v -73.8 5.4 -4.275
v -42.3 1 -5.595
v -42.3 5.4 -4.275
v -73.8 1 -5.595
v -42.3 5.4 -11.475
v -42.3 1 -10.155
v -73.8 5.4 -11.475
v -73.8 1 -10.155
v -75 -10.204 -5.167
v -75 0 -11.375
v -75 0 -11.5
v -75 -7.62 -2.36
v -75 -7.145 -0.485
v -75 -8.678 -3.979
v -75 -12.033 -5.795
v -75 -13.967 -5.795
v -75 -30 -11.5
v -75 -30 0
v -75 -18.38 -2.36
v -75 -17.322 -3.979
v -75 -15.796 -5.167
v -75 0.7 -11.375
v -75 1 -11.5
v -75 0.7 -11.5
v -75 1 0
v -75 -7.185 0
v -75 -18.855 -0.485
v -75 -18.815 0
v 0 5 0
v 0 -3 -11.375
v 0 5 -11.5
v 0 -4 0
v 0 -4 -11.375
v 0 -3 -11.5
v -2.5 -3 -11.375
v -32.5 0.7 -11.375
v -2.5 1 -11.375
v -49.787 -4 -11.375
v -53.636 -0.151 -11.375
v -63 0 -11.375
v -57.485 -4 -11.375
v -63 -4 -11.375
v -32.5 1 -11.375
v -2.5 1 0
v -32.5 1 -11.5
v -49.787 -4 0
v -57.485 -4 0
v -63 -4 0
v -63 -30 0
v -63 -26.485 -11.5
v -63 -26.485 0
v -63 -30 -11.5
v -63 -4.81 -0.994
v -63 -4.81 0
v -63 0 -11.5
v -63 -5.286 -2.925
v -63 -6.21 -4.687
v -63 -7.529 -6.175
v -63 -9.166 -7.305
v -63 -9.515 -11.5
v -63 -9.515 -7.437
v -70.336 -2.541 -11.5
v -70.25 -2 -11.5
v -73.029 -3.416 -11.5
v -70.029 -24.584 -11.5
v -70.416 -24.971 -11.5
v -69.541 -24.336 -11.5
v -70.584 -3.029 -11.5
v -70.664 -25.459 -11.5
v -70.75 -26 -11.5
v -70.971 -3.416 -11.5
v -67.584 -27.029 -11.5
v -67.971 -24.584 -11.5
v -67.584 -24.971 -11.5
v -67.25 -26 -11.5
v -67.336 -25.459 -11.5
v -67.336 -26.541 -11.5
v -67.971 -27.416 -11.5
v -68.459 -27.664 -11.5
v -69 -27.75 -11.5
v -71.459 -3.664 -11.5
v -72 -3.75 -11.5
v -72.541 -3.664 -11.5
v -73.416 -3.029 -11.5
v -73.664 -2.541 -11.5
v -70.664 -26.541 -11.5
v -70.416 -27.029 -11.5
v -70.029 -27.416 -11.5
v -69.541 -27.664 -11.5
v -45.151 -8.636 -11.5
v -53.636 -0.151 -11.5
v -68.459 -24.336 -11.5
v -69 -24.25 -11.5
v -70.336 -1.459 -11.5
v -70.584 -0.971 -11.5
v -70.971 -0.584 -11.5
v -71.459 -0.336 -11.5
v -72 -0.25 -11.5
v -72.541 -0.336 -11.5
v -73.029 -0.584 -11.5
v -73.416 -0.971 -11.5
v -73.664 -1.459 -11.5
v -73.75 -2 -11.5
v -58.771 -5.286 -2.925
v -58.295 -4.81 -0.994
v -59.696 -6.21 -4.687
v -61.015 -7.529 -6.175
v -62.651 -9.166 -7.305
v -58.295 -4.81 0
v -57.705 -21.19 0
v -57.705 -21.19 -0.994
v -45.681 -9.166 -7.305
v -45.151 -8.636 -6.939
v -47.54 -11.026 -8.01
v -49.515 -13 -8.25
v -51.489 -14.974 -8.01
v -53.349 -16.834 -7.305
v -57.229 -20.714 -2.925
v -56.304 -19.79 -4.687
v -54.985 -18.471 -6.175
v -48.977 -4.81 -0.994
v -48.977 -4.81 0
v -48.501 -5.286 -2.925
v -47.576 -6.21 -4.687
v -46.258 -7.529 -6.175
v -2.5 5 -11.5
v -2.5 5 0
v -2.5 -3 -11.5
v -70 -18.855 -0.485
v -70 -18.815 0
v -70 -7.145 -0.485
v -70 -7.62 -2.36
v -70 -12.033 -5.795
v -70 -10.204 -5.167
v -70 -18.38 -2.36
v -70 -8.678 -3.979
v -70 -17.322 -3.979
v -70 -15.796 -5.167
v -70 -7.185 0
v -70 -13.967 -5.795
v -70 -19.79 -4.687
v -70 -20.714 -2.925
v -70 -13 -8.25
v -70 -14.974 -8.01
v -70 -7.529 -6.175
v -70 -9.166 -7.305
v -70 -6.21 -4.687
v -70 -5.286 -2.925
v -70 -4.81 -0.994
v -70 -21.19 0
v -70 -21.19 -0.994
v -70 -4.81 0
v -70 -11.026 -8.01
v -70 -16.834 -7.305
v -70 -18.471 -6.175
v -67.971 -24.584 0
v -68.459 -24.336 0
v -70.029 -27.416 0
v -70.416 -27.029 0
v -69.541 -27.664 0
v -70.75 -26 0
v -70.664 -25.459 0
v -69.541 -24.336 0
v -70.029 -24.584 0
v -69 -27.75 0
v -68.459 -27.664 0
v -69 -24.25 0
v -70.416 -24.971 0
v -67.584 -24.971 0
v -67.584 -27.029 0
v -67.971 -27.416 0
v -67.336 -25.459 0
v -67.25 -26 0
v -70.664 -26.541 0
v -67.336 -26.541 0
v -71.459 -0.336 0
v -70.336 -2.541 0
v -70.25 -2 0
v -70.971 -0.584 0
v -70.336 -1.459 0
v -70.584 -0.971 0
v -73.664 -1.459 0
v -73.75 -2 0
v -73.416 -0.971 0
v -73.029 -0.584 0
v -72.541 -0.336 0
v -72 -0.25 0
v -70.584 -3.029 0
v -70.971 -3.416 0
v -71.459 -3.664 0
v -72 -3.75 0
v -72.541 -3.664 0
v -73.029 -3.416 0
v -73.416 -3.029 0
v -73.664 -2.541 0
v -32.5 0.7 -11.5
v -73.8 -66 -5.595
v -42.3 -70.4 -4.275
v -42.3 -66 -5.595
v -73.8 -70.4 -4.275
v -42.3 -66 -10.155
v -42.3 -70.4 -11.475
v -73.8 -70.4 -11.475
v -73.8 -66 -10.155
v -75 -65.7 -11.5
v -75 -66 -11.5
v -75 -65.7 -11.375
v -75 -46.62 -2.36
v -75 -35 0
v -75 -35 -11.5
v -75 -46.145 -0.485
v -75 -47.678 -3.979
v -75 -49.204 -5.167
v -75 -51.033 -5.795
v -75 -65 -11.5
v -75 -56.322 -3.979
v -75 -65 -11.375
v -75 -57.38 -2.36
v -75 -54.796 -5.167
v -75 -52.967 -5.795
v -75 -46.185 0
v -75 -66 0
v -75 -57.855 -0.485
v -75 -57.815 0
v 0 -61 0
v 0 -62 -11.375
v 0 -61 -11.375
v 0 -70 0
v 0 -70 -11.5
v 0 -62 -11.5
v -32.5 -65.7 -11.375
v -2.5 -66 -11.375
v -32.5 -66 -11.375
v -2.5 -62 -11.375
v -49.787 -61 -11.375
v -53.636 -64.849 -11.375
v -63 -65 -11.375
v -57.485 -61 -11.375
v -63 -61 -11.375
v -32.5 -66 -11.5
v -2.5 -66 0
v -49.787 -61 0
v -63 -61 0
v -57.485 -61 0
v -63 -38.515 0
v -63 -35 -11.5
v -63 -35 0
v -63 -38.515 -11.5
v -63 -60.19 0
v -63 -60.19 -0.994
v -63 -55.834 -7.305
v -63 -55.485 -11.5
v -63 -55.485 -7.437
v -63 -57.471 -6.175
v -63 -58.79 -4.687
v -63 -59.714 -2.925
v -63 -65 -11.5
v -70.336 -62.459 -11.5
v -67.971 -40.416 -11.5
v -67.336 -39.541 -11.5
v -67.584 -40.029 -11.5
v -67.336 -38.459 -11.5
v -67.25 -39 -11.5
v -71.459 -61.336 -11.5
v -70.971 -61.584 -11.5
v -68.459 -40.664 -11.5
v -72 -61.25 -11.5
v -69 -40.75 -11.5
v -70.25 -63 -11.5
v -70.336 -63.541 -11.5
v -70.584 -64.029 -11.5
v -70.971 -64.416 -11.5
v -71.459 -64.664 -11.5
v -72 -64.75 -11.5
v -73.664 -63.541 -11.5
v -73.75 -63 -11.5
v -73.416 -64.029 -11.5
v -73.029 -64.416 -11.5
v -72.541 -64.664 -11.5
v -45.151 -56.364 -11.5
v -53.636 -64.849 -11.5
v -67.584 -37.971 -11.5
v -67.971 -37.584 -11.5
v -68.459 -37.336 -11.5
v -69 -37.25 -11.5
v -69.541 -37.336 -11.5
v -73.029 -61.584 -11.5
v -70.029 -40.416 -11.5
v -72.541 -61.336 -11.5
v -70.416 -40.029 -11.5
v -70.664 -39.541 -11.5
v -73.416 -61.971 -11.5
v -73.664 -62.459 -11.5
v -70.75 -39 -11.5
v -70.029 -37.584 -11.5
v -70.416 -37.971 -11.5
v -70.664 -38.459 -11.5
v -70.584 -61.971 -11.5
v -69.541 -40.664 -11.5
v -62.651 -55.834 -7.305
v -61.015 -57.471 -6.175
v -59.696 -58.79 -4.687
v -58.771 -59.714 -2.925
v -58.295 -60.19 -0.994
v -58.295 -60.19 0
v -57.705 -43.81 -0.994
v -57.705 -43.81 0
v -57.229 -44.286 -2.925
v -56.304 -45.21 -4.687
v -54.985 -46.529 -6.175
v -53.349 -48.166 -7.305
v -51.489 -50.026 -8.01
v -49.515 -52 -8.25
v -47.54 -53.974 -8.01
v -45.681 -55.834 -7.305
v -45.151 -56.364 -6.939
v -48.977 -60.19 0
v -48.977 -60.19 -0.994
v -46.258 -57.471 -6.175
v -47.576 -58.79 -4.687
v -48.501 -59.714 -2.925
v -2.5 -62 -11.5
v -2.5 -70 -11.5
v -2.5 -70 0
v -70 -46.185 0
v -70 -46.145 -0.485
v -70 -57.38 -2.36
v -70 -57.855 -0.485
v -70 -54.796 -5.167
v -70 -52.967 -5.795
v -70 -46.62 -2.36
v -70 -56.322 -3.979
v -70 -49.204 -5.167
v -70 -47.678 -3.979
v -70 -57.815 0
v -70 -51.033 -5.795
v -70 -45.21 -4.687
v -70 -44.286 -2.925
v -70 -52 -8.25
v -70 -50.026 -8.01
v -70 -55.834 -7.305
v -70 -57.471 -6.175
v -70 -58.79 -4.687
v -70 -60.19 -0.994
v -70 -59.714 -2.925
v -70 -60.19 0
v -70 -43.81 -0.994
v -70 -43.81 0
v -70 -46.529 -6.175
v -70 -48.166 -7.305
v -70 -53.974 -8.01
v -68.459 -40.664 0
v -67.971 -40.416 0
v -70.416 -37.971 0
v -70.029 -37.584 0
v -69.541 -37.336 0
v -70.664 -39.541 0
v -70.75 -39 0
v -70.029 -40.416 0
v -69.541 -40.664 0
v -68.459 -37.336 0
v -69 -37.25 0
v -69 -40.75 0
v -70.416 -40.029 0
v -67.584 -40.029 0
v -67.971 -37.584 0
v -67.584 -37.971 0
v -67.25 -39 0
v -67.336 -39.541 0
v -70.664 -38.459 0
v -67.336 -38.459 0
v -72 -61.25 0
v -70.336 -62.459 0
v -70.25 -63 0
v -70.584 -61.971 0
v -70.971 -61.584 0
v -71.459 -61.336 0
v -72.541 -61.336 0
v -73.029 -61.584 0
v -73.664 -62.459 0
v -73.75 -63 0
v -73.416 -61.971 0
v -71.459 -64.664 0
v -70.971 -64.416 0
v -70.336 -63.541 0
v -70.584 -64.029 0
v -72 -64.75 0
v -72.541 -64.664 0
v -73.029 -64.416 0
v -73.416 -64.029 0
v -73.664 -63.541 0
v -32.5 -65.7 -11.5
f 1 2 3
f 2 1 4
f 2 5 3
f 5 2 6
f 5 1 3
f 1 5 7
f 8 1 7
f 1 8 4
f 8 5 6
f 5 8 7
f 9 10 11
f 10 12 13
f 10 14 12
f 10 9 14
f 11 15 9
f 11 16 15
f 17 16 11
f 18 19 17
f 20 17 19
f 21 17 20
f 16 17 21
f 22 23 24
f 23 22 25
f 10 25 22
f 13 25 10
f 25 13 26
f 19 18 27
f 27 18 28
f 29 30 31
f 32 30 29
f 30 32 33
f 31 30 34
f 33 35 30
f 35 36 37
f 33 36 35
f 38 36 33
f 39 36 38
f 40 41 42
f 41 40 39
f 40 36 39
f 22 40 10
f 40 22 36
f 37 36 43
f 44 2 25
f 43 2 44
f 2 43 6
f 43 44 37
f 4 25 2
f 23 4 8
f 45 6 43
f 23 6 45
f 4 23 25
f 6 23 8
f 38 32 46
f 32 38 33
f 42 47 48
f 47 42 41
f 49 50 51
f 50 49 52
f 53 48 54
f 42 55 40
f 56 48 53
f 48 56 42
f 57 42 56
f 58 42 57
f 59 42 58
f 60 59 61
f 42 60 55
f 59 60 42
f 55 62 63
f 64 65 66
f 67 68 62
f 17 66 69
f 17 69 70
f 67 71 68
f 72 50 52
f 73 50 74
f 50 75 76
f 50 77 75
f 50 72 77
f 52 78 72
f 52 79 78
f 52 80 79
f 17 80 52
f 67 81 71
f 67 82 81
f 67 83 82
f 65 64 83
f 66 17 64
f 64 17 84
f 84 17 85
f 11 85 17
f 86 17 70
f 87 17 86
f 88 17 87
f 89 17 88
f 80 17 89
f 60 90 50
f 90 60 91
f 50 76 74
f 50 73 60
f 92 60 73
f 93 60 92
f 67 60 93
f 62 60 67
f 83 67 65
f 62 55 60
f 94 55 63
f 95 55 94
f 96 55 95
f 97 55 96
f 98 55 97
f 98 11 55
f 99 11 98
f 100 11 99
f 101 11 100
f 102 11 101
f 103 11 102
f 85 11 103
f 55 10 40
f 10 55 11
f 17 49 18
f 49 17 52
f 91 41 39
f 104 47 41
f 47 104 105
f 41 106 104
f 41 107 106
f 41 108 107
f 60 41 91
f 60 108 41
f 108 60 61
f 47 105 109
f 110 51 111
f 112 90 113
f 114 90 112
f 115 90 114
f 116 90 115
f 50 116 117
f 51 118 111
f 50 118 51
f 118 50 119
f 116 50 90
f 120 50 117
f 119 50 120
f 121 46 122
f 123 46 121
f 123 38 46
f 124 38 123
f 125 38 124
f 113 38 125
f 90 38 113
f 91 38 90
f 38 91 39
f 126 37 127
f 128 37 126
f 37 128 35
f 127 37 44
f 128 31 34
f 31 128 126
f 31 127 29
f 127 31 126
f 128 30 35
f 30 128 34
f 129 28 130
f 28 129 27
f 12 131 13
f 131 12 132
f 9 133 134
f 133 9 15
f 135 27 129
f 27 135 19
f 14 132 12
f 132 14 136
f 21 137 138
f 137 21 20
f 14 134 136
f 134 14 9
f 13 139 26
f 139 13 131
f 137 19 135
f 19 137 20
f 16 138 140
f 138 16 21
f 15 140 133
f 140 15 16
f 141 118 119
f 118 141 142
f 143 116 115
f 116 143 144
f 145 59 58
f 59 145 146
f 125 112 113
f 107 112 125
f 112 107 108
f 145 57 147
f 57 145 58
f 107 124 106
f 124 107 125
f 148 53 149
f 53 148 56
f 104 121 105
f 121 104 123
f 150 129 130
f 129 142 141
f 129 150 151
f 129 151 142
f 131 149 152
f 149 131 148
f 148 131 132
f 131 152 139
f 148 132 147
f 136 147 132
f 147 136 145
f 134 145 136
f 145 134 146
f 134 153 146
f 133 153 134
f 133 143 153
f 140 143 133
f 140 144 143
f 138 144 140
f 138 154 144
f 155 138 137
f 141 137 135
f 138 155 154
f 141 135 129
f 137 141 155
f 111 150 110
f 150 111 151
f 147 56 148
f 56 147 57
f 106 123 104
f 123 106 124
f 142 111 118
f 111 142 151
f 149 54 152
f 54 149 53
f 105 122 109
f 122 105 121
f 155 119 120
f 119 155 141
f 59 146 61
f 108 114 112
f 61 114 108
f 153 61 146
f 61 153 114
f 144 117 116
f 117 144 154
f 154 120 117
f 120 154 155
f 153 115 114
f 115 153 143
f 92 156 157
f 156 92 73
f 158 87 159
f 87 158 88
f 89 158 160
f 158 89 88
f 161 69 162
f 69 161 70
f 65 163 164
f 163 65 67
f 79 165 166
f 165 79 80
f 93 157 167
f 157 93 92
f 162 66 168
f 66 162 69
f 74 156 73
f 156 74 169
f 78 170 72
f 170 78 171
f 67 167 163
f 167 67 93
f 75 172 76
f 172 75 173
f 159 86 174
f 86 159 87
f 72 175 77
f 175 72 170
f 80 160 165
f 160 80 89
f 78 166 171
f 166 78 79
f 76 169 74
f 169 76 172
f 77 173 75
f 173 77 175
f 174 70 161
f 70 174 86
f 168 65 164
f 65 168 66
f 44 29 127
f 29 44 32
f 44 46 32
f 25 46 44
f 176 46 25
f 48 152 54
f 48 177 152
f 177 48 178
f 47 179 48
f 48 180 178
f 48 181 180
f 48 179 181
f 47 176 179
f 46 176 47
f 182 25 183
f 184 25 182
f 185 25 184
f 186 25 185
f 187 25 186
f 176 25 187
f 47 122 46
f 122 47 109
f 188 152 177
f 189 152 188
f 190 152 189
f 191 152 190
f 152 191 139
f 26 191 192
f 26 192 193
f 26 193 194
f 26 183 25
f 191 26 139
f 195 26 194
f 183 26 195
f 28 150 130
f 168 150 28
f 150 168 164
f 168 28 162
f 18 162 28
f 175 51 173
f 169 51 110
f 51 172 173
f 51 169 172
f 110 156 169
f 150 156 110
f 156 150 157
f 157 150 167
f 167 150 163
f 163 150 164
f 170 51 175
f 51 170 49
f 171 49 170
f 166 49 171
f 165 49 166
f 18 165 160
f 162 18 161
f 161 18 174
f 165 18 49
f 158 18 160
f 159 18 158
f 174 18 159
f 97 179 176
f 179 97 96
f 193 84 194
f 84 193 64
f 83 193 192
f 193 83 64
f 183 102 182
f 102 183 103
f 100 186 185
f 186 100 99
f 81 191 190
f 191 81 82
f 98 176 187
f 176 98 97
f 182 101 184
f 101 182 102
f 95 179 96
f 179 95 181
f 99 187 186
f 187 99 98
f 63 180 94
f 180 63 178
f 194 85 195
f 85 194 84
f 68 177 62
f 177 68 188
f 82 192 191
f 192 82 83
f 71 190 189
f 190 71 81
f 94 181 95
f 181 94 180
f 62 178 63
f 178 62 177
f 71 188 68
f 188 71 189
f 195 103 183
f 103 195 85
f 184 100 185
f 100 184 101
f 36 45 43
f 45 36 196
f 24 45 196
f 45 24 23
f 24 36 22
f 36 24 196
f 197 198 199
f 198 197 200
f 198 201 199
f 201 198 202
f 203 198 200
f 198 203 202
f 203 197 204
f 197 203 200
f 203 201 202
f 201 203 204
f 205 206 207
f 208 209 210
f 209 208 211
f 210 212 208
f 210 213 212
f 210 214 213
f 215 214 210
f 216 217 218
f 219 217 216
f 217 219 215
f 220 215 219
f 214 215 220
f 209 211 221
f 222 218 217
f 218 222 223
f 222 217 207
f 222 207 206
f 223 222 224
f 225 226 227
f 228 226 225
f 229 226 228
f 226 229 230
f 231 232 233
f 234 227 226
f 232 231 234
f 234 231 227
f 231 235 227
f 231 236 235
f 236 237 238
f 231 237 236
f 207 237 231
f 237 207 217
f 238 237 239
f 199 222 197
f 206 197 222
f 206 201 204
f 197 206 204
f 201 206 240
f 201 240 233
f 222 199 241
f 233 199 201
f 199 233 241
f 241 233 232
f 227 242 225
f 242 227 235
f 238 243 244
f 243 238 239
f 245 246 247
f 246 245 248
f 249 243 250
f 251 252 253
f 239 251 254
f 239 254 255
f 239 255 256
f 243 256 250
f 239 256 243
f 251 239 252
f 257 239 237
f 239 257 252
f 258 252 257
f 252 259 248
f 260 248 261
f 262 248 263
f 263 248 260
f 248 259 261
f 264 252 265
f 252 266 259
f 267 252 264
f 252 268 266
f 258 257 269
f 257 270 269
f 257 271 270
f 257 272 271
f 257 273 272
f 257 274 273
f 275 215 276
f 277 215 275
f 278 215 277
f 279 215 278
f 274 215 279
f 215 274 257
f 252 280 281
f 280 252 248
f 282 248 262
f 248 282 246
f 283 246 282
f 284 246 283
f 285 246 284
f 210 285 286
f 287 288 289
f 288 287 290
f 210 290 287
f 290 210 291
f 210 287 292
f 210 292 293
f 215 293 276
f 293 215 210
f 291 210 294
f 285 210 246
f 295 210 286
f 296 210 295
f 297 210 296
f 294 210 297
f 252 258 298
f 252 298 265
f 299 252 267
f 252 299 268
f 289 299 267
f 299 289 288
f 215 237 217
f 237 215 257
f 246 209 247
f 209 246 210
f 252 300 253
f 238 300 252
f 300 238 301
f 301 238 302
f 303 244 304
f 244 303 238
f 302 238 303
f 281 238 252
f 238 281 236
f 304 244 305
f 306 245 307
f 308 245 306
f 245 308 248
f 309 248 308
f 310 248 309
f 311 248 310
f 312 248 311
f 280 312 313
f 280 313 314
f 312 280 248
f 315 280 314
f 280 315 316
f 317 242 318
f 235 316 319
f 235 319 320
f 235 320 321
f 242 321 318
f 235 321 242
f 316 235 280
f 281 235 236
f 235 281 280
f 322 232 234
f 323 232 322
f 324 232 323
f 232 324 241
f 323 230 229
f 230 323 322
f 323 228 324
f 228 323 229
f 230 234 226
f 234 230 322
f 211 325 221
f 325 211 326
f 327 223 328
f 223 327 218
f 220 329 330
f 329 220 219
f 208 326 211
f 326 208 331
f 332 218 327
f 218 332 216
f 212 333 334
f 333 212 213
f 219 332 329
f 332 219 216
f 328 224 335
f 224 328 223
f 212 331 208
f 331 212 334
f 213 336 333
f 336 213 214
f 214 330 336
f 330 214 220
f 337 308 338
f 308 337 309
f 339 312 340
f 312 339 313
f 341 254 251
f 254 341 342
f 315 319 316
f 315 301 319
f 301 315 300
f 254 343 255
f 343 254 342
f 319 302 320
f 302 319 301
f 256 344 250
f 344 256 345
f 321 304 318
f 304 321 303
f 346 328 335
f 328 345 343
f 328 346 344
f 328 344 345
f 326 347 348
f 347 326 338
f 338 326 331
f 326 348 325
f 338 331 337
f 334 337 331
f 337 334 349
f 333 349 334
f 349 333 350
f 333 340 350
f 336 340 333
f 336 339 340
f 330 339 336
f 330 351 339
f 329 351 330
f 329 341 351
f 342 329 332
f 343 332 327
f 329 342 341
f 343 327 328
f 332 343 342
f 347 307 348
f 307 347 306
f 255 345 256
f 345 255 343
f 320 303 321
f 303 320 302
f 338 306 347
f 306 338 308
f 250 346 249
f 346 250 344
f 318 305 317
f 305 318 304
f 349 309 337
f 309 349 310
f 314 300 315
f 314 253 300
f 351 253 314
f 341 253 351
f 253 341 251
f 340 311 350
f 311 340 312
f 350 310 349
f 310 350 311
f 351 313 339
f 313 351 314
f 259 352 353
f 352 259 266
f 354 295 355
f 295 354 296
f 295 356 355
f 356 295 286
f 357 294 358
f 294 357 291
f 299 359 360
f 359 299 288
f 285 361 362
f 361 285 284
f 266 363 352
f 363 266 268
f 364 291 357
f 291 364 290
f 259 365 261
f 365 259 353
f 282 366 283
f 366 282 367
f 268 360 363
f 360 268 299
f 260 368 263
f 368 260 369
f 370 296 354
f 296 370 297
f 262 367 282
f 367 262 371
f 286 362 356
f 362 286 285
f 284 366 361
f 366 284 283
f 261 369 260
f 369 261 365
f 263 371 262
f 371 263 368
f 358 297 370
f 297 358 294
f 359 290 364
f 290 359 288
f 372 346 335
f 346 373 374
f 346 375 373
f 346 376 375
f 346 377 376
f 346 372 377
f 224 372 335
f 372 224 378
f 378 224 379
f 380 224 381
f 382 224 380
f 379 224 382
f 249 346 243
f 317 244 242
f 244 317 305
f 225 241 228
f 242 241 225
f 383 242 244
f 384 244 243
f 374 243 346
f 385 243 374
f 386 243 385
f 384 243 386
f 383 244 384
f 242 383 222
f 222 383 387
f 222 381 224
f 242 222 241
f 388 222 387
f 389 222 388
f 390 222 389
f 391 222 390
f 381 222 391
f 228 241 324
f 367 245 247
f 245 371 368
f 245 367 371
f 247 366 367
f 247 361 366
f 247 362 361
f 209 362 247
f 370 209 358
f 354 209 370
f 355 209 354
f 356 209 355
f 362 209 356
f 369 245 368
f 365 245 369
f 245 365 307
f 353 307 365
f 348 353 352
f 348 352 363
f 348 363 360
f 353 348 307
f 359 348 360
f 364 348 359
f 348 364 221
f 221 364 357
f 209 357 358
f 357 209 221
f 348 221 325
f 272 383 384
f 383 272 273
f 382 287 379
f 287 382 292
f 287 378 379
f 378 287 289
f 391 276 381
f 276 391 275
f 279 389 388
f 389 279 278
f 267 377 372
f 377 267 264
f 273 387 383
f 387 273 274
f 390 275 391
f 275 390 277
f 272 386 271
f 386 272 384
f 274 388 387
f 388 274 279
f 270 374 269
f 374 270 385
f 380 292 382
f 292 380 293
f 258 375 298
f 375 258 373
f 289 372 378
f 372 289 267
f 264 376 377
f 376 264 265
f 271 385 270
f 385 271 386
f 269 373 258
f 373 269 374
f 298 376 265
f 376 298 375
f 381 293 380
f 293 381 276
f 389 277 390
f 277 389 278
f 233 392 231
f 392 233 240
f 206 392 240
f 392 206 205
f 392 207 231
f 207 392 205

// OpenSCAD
// file: include.scad
//////////////////      END SECTION       //////////////////

	module added_pins(){
		difference(){
			union(){
				translate([30/(15/4),obj_leg*leg_length,30/(15/4)]) pin();
				translate([30/(15/4)+14.5,obj_leg*leg_length,30/(15/4)+14]) pin();
			}
			union(){
							translate([30/(15/4)+13.5,obj_leg*leg_length-20,30/(15/4)+5])cube(size=[2,40,15]);
							translate([30/(15/4)+7.5,obj_leg*leg_length-20,30/(15/4)+15])rotate([0,90,0]) cube(size=[2,40,15]);	

							translate([30/(15/4)-1,obj_leg*leg_length-20,30/(15/4)-8])cube(size=[2,40,15]);
							translate([30/(15/4)-10,obj_leg*leg_length-20,30/(15/4)+1])rotate([0,90,0]) cube(size=[2,40,15]);
			}
		}
	}
	module taken_pins() {
		translate([30/(15/4)+14,obj_leg*leg_length-10,30/(15/4)]) mirror_pin();
		translate([30/(15/4),obj_leg*leg_length-10,30/(15/4)+15]) mirror_pin();
	}


//////////////////      OTHER STUFF       //////////////////

	module holes() {
		rotate([0,0,90]) for(y=[0:other_holes])
		translate([obj_leg+y*15,-15.5,7.5]) union() {
			translate([7.5,0,15]) hole_up();
			hole_down();
		}
	}
	module extend_holes() {
	module top(){
		rotate([0,0,90]) for(y=[0:other_holes+1])
		translate([(30/4)+y*15,-15.5,7.5]) union() {
			translate([7.5,0,15]) hole_up();
		}
	}
	module bottom(){
		rotate([0,0,90]) for(y=[0:other_holes+2])
		translate([(30/4)+y*15,-15.5,7.5]) union() {
			hole_down();
		
}
	}
	union(){
		top();
		bottom();
	}
	}

	module hole() {
		union() {
			rotate([90, 90, 0]) cylinder(h=40, d=hole_pin_diameter, center=true);
			translate([0,7.5,0]) sphere(d=hole_ball_size);
			translate([0,-6,0]) sphere(d=hole_ball_size);
		}
	}
	module hole_up() {
		union() {
			rotate([90, 90, 0]) cylinder(h=40, d=hole_pin_diameter, center=true);
			translate([0,7.5,10]) cylinder(h=hole_pin_height, d=hole_pin_diameter, center=true);
			translate([0,-6,10]) cylinder(h=hole_pin_height, d=hole_pin_diameter, center=true);
			translate([0,7.5,0]) sphere(d=hole_ball_size);
			translate([0,-6,0]) sphere(d=hole_ball_size);
		}
	}
	module hole_down() {
		union() {
			rotate([90, 90, 0]) cylinder(h=40, d=hole_pin_diameter, center=true);
			translate([0,7.5,-10]) cylinder(h=hole_pin_height, d=hole_pin_diameter, center=true);
			translate([0,-6,-10]) cylinder(h=hole_pin_height, d=hole_pin_diameter, center=true);
			translate([0,7.5,0]) sphere(d=hole_ball_size);
			translate([0,-6,0]) sphere(d=hole_ball_size);
		}
	}
	module pin() {
		union() {
			rotate([90, 90, 0]) cylinder(h=pin_height, d=pin_diameter, center=true);
			translate([0,7.5,0]) sphere(d=ball_size);
		}
	}

	module mirror_pin() {
		rotate([90, 90, 0]) cylinder(h=hole_pin_height+small_number, d=hole_pin_diameter, center=true);
		translate([0,-(pin_height-(ball_size/2)),0]) sphere(d=ball_size);
	}


//////////////////      SOME RACK AND Z THINGS       //////////////////

module z_holes() {
    rotate([0,-90,0]) for(z=[0:z_hole_number])
    translate([22.5+z*15,16,-12])
        hole();
}

module pin_cuts() {
	union(){
		cube(size=[2,10,40], center=true);
		rotate([0,0,90]) cube(size=[2,10,40], center=true);
	}
}
module pin_uncut() {
	union(){
		rotate([0, 0, 90]) cylinder(h=hole_pin_height, d=hole_pin_diameter, center=true);
		translate([0,0,10]) sphere(d=ball_hole);
	}
}


module pin_out() {
	union(){
		rotate([0, 0, 90]) cylinder(h=pin_height, d=pin_diameter, center=true);
		translate([0,0,10]) sphere(d= ball_size);
	}
}


module pins_z(){
	difference() {
		pin_out();
		pin_cuts();
	}
}
//////////////////      RACK AND SLIDE     ///////////////////

module straight_pins() {
	for(z=[0:((((obj_leg*leg_length)*2)-(obj_leg*2))/3)/14.5]) rotate([-90,0,0]) translate([z*15,30/(15/4),14]) pins_z();
	for(z=[0:((((obj_leg*leg_length)*2)-(obj_leg*2))/3)/14.5]) rotate([-90,0,0]) translate([z*15,30/(15/4)-14,14]) pins_z();
}
module stagger_pins() {
	for(z=[0:((((obj_leg*leg_length)*2)-(obj_leg*2))/3)/14.5]) rotate([-90,0,0]) translate([z*15,30/(15/4),14]) pins_z();
	for(z=[0:((((obj_leg*leg_length)*2)-(obj_leg*2))/3)/14.5]) rotate([-90,0,0]) translate([z*15+7,30/(15/4)-14,14]) pins_z();
}


//////////////////      DOVE TAIL       //////////////////

module male_dovetail(height) {
	dovetail_3d(max_width,min_width,depth,height);
}

module dovetail_3d(max_width=11, min_width=5, depth=5, height=30) {
	linear_extrude(height=height, convexity=2)
		dovetail_2d(max_width,min_width,depth);
}

module dovetail_2d(max_width=11, min_width=5, depth=5) {
	angle=atan((max_width/2-min_width/2)/depth);
	echo("angle: ", angle);
	polygon(paths=[[0,1,2,3,0]], points=[[-min_width/2,0], [-max_width/2,depth], [max_width/2, depth], [min_width/2,0]]);
}

//bow tie
	module tie_end(height){
				rotate([0,0,0]) translate([0,-0.01,((obj_leg/2)/2)]) male_dovetail(height);
				rotate([0,90,0]) translate([0,-0.01,((obj_leg/2)/2)]) male_dovetail(height);
				rotate([0,180,0]) translate([0,-0.01,((obj_leg/2)/2)]) male_dovetail(height);
				rotate([0,-90,0]) translate([0,-0.01,((obj_leg/2)/2)]) male_dovetail(height);
	}

module bow_support(){
	difference(){
		intersection(){
			translate([-15,0,-15]) cube([30,9,30]);
			scale([1.05,1.05,1.05]) rotate([0,45,0]) tie_end();
		}
		cube([29.2,29.2,29.2], center=true);
	}
}

	module wrap(){
		depth = 30;
				translate([-15,30,15]) rotate([90,180,90]) male_dovetail(height=depth);
				rotate([0,90,0]) translate([-15,30,15]) rotate([90,180,90]) male_dovetail(height=depth);
				rotate([0,180,0]) translate([-15,30,15]) rotate([90,180,90]) male_dovetail(height=depth);
				rotate([0,-90,0]) translate([-15,30,15]) rotate([90,180,90]) male_dovetail(height=depth);
	}
// file: globals.scad
/*
Most things in this file is represented as one millimeter, so keep that in mind while changing things.
Some of the setting are not mm but at variables that you can set, such as 2*x=2x and you are setting what x is.
I will try to specify when things are variables and not exact measurements.
*/

obj_leg = 30;
leg_length = 5.5;
small_number = 0.001;
metal_core_rode_global = 5;


///////////////// number of holes /////////////////////
z_hole_number = 8;
other_holes = 8;

///////////////// Pins /////////////////////

//pins that poke out
ball_size = 10;
pin_height = 20;
pin_diameter = 6;


//holes
hole_ball_size = ball_size;
hole_pin_height = pin_height;
hole_pin_diameter = pin_diameter;

///////////////// Z THINGS /////////////////////

berring_slot_width = 7.5;
berring_slot_depth = 6.5;
metal_core_rode = 5;

///////////////// X THINGS /////////////////////

//male dove tails
max_width=8;
min_width=5;
depth=5;
height=obj_leg/2;

//female dove tails, this is found on the y mounts
girl_max_width=11;
girl_min_width=5;
girl_depth=5;
girl_height=obj_leg;


///////////////// Y THINGS /////////////////////
/*
The Y is so normal that all of those global variables at the top should change all of the setting in it, this section is set her incase there are variables set in the future development of this project.
*/
// main file
include <globals.scad>;
include <include.scad>;

hotend_depth = 75;
mounting_diamiter = 11.75;
top_diamiter = 16.5;
arm_thickness = 5;
snap_location = 47;
natch_height = 6;


module motor_mount_small(height=15){
	scale([.9,.9,.9]) 	translate([-8.75,1,snap_location]) male_dovetail(35);
}

module y_mount_added(){
	motor_mount_small();
	translate([1,-4+((10-arm_thickness)/2),hotend_depth/2]) cube([24.75,arm_thickness,hotend_depth], center=true);
    translate([1,-15,hotend_depth-(natch_height)]) cube([25,30,natch_height*2],center=true);
	translate([-4,-15,hotend_depth-15]) rotate([-45,0,0]) cube([15,30,natch_height*2],center=true);
	translate([1,1,0]) cube([25,8,5],center=true);
}

module y_mount_taken(){
        translate([0,-13,hotend_depth/2]) cylinder(h=70, d=mounting_diamiter);
	    translate([0,-13,0]) cylinder(h=70, d=top_diamiter);
		translate([0,-26,hotend_depth-natch_height]) rotate([0,-90,0]) cylinder(h=30, d=3.5, $fn=20);
		translate([0,-2,hotend_depth-natch_height+3]) rotate([0,-90,0]) cylinder(h=30, d=3.5, $fn=20);
}
module mount(){
    rotate([0,-90,0]){
        intersection(){
                    translate([-15,-30,0]) cube([15,100,100]);
            difference(){
                    y_mount_added();
                    y_mount_taken();
            }
        }
                translate([-11.5,.7,37.5+(hotend_depth-80)]) cube([7,.3,42.5]);
    }
}

mount();
translate([0,-65,0]) mirror([0,1,0]) mount();
